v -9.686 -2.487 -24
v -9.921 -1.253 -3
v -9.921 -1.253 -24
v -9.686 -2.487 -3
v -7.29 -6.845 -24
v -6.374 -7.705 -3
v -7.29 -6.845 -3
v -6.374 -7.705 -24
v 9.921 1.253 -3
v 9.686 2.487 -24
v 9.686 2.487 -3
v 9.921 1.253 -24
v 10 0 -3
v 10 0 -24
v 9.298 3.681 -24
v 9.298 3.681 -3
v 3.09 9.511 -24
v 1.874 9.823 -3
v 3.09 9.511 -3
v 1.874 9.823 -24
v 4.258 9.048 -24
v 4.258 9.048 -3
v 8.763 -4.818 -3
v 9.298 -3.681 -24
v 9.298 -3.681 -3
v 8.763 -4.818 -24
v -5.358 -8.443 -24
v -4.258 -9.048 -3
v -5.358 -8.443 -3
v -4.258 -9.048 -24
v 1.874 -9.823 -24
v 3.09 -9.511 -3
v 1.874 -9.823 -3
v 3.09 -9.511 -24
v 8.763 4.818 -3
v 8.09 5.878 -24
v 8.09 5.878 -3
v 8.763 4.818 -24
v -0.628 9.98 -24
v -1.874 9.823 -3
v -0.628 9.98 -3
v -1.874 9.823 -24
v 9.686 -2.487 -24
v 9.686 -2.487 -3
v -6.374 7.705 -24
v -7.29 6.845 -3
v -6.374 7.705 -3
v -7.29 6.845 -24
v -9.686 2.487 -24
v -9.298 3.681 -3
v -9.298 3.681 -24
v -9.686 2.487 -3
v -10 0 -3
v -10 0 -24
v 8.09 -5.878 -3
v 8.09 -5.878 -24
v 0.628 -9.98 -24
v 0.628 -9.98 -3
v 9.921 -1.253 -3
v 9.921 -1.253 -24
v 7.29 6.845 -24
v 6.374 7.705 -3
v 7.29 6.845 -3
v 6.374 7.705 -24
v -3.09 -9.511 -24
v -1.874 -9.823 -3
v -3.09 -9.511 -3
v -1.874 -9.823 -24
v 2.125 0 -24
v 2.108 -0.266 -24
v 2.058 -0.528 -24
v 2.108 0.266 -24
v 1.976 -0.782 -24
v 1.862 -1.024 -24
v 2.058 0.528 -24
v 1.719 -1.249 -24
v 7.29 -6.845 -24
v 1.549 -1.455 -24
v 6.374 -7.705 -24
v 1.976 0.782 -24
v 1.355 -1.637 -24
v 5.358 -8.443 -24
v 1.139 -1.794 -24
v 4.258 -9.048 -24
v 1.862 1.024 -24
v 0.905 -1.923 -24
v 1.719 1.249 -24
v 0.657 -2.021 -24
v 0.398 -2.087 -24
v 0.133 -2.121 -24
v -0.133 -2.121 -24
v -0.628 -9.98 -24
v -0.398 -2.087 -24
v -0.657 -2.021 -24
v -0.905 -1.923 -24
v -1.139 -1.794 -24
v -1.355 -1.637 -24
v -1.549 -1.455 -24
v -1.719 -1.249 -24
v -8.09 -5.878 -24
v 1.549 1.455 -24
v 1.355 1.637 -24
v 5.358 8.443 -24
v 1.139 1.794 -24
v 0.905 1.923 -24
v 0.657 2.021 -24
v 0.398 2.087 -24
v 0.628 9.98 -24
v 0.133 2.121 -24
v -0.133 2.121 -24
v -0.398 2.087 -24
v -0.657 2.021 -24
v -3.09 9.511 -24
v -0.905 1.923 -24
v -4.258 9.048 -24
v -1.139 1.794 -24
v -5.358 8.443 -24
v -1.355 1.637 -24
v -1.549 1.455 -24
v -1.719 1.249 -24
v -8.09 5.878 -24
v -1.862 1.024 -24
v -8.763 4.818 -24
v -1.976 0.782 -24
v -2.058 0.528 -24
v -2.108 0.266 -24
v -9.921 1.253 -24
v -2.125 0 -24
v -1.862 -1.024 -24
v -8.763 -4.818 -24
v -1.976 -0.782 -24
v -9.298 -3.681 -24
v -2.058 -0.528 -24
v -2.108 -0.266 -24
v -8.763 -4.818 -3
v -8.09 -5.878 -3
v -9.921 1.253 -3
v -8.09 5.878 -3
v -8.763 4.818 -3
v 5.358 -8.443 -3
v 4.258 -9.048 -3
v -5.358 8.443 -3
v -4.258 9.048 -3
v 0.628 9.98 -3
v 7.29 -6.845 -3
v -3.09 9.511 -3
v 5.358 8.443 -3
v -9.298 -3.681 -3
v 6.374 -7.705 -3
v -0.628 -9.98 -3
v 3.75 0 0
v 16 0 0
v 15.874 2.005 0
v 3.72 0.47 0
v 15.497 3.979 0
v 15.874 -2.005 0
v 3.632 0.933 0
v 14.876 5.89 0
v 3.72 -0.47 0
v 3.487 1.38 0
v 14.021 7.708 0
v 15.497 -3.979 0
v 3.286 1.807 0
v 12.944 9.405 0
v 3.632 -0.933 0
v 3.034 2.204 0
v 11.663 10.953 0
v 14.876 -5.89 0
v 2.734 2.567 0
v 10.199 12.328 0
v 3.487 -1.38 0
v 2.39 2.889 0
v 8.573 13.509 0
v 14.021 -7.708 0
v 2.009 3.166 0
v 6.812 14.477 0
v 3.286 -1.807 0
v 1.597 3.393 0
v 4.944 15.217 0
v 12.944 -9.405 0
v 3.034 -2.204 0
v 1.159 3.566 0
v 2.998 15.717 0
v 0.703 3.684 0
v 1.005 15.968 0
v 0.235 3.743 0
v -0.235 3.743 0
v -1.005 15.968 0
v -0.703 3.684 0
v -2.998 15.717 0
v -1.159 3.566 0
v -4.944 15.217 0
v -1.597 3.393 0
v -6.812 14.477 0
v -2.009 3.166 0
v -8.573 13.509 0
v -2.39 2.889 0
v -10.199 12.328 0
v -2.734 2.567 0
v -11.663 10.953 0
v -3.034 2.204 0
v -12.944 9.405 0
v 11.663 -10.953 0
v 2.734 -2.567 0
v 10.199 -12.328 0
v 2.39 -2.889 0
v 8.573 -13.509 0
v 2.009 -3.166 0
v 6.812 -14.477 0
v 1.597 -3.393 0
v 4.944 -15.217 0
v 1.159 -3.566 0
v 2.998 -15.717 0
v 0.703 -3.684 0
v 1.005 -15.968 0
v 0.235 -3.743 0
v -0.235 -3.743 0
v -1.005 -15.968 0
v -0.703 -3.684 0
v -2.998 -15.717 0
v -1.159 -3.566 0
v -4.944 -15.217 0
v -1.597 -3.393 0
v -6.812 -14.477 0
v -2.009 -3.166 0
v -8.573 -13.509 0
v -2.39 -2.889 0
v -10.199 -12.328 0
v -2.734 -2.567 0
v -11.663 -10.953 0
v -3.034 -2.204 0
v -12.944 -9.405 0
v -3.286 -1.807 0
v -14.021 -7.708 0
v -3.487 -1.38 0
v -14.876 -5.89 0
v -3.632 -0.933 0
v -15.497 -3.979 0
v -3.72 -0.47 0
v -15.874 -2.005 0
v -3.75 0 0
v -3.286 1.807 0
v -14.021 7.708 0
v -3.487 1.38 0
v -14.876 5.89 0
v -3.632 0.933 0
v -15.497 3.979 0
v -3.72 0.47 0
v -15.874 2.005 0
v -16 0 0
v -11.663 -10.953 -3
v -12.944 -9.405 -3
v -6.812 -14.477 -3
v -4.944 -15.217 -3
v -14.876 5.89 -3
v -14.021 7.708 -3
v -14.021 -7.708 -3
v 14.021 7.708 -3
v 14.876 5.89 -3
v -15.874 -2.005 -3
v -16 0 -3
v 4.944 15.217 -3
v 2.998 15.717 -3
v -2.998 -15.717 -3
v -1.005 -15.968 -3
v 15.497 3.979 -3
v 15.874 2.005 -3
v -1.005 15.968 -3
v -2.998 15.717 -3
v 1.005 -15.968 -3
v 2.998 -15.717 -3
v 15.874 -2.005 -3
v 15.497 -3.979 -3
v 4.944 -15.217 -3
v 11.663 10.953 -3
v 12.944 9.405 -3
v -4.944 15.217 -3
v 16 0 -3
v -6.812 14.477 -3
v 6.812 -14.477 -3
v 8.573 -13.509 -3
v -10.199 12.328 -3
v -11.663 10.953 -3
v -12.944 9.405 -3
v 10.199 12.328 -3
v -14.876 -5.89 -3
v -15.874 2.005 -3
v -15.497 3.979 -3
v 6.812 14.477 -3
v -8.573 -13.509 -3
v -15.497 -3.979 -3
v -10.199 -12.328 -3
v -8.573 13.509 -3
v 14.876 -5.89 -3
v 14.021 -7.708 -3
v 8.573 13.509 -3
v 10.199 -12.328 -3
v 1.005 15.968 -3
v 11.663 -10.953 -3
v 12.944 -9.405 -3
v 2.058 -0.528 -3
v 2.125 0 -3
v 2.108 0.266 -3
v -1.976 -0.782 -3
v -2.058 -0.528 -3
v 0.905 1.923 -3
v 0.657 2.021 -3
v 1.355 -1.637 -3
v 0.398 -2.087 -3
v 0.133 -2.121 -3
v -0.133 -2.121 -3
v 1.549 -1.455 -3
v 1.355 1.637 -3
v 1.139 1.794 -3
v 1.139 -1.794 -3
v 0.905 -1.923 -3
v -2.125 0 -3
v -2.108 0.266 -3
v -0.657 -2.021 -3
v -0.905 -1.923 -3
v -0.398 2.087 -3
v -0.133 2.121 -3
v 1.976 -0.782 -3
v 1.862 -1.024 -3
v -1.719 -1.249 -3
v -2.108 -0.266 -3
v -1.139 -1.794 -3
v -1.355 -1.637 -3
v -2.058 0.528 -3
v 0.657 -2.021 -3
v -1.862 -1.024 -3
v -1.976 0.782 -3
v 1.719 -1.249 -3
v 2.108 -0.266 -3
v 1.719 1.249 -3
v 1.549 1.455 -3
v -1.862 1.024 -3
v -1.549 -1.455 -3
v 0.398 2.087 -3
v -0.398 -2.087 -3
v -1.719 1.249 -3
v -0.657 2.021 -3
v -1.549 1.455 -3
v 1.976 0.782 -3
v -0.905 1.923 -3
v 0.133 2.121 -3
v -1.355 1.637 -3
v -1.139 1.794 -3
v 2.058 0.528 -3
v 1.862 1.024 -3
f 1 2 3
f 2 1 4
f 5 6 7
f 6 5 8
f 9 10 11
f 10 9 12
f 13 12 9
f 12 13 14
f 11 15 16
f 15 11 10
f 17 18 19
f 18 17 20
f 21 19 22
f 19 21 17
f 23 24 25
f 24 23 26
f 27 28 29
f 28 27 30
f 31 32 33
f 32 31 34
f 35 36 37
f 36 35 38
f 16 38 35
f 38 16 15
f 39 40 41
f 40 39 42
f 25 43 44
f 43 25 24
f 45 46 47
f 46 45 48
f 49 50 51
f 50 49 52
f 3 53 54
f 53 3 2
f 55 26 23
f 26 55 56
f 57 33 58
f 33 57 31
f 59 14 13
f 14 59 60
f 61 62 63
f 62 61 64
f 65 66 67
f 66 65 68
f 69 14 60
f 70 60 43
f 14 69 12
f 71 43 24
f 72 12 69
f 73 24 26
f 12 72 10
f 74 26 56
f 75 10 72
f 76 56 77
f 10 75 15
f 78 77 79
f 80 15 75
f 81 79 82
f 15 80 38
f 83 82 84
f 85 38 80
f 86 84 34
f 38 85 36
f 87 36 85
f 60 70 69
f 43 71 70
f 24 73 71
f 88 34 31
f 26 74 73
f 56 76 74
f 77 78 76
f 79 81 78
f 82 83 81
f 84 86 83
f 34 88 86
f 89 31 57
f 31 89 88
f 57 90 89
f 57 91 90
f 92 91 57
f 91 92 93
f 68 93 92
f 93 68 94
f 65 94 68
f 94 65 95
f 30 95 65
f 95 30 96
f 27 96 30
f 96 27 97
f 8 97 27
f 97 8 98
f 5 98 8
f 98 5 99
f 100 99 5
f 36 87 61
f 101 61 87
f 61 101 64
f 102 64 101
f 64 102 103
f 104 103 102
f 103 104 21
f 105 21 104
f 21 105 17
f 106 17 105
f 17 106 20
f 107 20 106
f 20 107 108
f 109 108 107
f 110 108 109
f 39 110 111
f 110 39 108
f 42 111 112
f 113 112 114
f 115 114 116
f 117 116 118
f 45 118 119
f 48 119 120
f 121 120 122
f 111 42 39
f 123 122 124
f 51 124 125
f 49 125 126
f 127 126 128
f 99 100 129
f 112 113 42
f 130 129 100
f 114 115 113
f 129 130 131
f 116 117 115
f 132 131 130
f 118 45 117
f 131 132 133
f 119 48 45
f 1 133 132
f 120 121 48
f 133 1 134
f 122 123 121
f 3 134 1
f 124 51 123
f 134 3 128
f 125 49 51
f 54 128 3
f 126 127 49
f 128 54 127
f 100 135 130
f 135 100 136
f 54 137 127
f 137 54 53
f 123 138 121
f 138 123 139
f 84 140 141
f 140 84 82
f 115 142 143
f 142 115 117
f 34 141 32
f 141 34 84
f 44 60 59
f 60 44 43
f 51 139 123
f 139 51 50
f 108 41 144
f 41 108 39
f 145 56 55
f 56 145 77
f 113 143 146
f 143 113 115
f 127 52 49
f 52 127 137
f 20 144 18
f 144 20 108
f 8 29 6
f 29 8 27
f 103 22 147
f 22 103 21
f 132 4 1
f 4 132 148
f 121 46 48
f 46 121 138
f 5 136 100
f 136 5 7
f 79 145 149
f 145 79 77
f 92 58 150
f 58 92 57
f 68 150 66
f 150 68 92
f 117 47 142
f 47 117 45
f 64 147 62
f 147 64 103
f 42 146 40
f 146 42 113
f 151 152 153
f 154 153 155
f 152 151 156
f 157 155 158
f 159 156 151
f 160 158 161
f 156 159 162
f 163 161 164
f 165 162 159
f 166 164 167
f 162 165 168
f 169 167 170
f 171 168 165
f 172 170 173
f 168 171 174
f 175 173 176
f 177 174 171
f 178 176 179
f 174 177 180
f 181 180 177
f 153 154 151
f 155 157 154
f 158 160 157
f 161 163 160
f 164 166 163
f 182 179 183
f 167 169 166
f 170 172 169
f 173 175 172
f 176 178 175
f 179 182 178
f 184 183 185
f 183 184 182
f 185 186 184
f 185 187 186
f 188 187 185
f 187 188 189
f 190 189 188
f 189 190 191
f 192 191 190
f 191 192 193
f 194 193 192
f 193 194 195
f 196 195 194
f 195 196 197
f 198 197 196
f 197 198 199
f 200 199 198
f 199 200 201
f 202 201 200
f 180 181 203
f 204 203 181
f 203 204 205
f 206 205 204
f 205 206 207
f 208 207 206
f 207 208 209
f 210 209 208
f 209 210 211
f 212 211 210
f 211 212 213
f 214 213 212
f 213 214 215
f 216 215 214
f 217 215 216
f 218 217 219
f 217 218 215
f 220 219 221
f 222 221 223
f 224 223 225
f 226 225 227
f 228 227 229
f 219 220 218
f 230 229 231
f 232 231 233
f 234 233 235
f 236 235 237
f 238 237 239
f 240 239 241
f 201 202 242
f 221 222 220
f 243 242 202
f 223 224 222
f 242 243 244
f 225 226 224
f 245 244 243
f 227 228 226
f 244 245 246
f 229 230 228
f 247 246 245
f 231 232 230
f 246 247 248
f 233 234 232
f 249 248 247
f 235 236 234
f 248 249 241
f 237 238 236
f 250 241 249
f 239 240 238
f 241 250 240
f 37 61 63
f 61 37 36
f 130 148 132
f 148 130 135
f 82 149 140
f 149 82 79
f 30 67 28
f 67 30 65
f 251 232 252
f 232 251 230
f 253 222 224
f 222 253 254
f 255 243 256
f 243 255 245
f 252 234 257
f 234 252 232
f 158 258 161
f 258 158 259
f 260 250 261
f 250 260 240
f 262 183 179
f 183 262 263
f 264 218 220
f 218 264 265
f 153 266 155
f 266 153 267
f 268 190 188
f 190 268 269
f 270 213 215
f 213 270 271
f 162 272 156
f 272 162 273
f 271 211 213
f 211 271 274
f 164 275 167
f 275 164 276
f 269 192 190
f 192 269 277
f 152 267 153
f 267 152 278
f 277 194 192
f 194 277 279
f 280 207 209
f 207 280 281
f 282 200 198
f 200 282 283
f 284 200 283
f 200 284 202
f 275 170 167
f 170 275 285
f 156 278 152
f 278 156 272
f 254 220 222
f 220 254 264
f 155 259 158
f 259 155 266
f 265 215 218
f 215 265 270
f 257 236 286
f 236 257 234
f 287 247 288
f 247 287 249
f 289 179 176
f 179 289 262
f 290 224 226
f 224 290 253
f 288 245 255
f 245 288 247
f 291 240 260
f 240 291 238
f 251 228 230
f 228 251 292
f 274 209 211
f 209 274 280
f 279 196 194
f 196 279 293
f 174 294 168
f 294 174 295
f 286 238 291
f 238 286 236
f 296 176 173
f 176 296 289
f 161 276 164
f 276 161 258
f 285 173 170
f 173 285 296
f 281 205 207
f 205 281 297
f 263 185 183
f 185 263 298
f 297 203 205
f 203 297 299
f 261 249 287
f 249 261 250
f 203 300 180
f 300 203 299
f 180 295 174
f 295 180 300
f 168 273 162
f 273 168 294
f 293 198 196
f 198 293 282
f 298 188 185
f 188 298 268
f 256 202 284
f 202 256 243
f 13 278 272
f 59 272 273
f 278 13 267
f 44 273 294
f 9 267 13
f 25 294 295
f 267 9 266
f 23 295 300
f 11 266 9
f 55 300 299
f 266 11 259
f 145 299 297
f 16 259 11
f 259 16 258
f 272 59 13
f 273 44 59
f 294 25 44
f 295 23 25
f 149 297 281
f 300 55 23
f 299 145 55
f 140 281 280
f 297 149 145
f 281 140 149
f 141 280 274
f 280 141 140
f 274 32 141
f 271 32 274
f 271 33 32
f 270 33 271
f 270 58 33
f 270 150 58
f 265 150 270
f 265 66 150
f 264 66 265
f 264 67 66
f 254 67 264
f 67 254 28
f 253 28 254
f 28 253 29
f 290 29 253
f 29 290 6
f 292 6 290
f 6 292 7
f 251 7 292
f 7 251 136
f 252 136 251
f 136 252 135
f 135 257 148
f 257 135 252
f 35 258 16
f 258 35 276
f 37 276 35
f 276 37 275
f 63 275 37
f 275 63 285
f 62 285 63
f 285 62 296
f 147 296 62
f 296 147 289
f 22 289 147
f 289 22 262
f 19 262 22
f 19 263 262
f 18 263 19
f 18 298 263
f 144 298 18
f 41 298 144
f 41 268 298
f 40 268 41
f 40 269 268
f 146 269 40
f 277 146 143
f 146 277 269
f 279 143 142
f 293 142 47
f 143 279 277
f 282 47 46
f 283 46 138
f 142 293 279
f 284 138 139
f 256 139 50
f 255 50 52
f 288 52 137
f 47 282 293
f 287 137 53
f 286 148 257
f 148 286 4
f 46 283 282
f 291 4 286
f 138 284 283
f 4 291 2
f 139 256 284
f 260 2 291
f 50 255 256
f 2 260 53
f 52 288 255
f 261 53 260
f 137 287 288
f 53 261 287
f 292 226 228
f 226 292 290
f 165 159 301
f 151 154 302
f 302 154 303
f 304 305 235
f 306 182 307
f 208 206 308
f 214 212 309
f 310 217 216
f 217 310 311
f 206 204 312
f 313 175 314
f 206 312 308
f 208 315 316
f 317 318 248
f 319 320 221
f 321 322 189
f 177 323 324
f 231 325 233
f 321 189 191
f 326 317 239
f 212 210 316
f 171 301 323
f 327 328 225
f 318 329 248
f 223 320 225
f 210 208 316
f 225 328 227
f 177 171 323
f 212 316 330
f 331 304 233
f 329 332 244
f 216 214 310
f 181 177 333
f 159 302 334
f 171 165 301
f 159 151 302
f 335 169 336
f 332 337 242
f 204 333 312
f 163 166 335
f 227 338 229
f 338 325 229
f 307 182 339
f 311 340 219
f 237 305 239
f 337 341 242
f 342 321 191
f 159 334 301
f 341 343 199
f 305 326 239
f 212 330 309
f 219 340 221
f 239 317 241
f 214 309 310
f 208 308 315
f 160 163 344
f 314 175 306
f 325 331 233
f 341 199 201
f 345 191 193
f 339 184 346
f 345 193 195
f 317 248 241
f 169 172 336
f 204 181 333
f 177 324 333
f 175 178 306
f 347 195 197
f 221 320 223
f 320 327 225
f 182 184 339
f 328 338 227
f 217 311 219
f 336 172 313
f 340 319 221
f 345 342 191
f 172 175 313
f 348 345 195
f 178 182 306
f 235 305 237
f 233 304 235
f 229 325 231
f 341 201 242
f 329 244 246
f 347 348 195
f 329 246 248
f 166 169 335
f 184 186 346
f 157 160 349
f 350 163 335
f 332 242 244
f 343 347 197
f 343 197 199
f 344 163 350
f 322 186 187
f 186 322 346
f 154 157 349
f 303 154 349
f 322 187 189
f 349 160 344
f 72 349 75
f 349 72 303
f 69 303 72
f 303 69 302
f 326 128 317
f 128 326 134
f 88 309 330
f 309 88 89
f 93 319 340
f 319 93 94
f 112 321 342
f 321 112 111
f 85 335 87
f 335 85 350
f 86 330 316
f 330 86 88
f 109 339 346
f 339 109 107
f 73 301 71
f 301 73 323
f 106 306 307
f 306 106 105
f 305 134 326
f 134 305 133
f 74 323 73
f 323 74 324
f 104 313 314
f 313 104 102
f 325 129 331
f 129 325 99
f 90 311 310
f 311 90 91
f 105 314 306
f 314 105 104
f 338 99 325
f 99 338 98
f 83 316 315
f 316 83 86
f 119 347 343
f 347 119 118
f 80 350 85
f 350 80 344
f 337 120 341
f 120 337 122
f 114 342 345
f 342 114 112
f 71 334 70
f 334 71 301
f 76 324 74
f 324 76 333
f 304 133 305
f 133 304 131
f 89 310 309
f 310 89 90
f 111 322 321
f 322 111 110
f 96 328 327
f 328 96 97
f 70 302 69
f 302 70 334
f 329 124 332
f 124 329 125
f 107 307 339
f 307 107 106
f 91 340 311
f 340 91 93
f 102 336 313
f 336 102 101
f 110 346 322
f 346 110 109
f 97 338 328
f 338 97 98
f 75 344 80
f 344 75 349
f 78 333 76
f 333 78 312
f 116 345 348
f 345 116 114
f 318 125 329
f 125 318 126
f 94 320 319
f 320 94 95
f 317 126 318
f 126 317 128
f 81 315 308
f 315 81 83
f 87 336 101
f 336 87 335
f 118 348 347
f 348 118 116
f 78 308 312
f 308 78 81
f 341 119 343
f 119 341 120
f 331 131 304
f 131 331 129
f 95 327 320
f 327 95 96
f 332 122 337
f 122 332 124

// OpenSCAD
$fn = 50;


difference() {
	union() {
		translate(v = [0, 0, -24.0000000000]) {
			cylinder(h = 24, r = 10.0000000000);
		}
		translate(v = [0, 0, -3.0000000000]) {
			cylinder(h = 3, r = 16.0000000000);
		}
	}
	union() {
		translate(v = [0, 0, 0]) {
			rotate(a = [0, 0, 0]) {
				difference() {
					union() {
						#translate(v = [0, 0, -24.0000000000]) {
							cylinder(h = 24, r = 2.0000000000);
						}
						#translate(v = [0, 0, -3]) {
							cylinder(h = 3, r1 = 2.1250000000, r2 = 3.7500000000);
						}
						#translate(v = [0, 0, -24.0000000000]) {
							cylinder(h = 24, r = 2.1250000000);
						}
						#translate(v = [0, 0, -24.0000000000]) {
							cylinder(h = 24, r = 2.0000000000);
						}
					}
					union();
				}
			}
		}
	}
}
